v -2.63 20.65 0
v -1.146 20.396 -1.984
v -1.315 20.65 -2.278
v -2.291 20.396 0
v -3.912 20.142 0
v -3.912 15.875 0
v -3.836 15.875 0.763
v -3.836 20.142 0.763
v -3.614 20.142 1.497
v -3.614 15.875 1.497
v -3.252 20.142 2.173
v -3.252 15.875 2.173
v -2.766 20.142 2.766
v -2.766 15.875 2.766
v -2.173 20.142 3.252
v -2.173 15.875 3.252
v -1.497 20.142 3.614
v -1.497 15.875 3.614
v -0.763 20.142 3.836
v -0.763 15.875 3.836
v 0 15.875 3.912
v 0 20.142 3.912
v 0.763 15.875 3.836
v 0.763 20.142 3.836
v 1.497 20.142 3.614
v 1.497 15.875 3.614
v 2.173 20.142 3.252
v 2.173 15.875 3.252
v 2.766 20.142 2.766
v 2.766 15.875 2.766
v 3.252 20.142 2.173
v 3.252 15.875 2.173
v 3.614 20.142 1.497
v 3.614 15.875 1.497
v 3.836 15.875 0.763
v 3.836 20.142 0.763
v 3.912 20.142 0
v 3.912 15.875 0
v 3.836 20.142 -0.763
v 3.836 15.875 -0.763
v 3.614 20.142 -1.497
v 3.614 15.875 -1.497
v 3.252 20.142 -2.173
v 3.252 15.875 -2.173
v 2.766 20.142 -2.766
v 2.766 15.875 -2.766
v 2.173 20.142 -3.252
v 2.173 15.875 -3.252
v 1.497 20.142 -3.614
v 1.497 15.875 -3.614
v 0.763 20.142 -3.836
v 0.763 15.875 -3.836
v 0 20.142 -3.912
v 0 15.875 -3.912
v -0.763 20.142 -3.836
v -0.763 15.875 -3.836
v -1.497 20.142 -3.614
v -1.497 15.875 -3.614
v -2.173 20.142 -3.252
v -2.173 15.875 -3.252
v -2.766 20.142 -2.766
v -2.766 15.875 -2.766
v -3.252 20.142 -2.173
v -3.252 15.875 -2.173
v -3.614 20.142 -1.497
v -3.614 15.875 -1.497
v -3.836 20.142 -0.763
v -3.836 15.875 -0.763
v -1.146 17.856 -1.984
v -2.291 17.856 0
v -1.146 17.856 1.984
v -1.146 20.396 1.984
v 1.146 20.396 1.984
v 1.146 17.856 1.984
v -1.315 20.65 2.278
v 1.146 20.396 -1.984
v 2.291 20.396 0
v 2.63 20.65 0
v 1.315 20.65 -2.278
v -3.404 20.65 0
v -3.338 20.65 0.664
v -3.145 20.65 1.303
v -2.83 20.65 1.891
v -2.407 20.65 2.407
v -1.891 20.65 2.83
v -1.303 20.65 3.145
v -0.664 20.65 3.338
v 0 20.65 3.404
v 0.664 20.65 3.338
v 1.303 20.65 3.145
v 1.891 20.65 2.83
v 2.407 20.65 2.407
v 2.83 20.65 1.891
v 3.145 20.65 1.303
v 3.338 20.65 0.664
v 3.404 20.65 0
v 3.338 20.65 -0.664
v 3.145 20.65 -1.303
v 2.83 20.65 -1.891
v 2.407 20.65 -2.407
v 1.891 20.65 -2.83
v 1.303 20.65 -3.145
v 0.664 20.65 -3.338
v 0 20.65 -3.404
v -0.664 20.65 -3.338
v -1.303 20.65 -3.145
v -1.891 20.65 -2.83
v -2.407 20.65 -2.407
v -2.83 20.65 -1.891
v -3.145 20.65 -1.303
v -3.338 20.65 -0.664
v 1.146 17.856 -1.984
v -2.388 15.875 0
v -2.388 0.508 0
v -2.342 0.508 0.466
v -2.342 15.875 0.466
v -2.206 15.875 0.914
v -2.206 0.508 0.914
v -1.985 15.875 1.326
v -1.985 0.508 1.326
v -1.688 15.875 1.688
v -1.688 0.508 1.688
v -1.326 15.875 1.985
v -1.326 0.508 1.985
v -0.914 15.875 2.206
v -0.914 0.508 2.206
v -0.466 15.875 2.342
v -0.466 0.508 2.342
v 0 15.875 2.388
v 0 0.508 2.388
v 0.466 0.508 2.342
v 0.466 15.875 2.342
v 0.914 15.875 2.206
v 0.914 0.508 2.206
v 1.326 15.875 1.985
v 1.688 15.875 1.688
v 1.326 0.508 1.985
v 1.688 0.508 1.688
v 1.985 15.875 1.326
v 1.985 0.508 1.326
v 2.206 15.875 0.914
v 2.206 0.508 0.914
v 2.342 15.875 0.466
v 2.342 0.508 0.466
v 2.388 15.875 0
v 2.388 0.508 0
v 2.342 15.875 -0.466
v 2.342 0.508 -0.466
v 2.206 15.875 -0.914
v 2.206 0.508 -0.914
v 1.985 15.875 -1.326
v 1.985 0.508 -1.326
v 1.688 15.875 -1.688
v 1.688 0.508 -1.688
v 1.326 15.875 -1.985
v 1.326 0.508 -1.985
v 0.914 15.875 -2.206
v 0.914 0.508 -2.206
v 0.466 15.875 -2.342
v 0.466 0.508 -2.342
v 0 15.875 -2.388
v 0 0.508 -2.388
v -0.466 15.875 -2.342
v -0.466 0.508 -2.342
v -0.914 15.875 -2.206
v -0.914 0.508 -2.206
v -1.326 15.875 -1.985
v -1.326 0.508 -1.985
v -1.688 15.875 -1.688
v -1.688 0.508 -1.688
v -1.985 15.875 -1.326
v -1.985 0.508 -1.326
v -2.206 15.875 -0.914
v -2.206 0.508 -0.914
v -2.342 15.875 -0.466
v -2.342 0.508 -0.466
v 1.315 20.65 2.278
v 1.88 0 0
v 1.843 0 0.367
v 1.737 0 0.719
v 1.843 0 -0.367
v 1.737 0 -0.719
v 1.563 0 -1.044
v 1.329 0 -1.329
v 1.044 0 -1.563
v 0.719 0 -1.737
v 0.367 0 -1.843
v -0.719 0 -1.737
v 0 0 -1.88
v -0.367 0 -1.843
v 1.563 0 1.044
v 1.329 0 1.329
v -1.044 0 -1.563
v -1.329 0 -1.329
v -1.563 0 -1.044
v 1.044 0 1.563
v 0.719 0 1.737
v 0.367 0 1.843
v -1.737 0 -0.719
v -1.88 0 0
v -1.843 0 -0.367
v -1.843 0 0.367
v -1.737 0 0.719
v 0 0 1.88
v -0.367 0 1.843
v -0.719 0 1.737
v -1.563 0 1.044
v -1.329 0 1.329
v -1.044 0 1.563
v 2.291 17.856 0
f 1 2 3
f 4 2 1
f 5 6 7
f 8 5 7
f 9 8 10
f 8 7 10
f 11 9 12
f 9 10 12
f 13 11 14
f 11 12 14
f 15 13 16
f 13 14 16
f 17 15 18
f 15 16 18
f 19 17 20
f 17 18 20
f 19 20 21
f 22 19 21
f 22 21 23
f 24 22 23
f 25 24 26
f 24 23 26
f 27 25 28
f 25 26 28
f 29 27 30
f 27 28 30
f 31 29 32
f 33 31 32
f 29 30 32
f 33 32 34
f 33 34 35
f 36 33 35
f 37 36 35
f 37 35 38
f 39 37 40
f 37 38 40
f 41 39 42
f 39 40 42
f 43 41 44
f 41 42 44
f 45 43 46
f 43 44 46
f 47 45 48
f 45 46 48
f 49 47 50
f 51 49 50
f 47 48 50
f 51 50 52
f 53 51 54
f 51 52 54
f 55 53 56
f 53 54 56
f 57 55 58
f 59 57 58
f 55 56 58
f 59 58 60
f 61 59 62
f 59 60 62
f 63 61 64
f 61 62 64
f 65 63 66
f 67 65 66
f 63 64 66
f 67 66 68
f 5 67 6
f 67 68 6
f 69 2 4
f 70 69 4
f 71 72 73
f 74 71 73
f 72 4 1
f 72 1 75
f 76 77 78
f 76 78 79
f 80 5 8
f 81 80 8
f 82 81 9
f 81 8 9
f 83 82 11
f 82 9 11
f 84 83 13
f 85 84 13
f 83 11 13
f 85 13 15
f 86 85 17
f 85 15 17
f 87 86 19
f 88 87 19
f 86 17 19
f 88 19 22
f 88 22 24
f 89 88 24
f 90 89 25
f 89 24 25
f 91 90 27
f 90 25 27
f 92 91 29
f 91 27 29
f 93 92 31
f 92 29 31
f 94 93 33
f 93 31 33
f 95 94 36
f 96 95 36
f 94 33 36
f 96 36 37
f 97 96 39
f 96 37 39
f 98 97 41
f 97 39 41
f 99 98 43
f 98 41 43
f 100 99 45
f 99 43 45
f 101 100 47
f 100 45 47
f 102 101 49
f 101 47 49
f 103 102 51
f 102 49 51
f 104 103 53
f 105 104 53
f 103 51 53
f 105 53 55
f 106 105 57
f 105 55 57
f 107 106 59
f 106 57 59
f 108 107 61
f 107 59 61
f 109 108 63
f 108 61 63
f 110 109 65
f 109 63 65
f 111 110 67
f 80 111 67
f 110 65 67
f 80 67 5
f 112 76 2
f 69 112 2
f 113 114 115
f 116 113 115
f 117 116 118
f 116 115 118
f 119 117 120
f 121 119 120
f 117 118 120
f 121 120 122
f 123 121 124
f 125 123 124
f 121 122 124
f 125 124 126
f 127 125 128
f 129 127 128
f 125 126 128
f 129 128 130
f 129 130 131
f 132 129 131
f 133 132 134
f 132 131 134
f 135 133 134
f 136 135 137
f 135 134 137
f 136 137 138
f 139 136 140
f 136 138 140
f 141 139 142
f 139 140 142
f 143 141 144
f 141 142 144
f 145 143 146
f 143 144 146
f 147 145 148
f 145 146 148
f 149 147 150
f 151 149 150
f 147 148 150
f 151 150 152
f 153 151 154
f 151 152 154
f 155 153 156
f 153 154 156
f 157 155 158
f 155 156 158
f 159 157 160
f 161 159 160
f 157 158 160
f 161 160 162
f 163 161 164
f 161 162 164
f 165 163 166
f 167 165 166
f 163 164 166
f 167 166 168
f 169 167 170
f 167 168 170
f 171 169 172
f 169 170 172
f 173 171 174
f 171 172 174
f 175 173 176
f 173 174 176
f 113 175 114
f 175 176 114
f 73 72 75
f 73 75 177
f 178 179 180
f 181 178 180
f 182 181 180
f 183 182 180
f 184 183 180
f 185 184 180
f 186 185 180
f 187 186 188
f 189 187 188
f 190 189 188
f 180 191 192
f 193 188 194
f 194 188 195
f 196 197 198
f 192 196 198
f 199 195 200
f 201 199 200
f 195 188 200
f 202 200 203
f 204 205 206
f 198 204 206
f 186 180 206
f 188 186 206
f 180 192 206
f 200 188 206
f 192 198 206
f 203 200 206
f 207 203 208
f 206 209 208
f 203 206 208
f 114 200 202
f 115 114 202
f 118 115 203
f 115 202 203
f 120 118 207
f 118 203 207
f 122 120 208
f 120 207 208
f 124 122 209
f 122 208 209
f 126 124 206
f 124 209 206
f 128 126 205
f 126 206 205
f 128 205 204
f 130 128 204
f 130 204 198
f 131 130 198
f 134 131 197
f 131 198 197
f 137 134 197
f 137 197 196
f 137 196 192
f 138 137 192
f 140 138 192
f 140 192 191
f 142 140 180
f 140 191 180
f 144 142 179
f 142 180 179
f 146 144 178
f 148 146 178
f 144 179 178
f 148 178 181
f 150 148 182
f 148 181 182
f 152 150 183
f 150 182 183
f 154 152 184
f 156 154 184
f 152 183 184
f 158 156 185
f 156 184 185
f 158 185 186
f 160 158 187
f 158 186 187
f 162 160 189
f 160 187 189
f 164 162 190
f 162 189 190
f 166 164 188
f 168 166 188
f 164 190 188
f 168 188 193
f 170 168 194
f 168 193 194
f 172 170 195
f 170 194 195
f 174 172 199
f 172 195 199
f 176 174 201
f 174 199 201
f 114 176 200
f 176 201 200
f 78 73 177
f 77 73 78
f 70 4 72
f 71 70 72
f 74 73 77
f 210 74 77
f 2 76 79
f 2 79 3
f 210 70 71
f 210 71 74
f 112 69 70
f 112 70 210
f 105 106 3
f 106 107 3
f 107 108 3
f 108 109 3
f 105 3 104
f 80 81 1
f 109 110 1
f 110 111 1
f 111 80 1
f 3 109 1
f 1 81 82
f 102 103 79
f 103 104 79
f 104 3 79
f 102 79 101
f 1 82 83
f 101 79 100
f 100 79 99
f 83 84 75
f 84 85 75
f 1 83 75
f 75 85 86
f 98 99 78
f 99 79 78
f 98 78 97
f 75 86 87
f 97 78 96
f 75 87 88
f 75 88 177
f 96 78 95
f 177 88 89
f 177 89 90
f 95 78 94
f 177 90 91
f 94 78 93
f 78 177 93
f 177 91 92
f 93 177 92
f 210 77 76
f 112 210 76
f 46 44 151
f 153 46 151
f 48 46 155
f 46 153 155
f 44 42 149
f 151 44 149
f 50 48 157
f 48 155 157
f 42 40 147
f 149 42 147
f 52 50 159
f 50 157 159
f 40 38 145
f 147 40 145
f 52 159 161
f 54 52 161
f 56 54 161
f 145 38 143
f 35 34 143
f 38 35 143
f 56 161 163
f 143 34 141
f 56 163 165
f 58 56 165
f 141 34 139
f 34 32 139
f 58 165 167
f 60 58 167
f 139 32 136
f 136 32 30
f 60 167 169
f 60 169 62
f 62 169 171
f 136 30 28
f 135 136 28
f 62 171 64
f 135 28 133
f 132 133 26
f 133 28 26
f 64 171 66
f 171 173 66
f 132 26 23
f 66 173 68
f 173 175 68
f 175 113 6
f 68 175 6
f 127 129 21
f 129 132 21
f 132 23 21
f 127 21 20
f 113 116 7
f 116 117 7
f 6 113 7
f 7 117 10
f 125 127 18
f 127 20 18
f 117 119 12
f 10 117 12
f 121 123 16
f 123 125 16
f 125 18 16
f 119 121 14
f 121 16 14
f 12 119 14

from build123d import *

# Parameters (mm, degrees)
EXTRUDE1_DEPTH = 2.794
CHAMFER1_SIZE  = 0.508
CHAMFER2_SIZE  = 0.29329394
CHAMFER2_SIZE2 = 0.253999961


with BuildPart() as part:
    # Sketch1 → Revolve1 (revolve)
    with BuildSketch(Plane.XY):
        Polygon((0, 0), (0, 20.6502), (-3.9116, 20.6502), (-3.9116, 15.875), (-2.3876, 15.875), (-2.3876, 0), align=None)
    revolve(axis=Axis((0, 0, 0), (0, 1, 0)))

    # Sketch2 → Extrude1 (cut)
    with BuildSketch(Plane(origin=(0, 20.6502, 0), x_dir=(1, 0, 0), z_dir=(0, 1, 0))):
        Polygon((2.2913594, 0), (1.1456797, 1.98437545), (-1.1456797, 1.98437545), (-2.2913594, 0), (-1.1456797, -1.98437545), (1.1456797, -1.98437545), align=None)
    extrude(amount=-EXTRUDE1_DEPTH, mode=Mode.SUBTRACT)

    # Chamfer1
    chamfer1_edges = [part.edges().sort_by_distance(p)[0] for p in [
        (2.3876, 0, 0),
        (3.9116, 20.6502, 0),
    ]]
    chamfer(chamfer1_edges, length=CHAMFER1_SIZE)

    # Chamfer2
    chamfer2_edges = [part.edges().sort_by_distance(p)[0] for p in [
        (1.71851955, 20.6502, 0.992187725),
        (1.71851955, 20.6502, -0.992187725),
        (0, 20.6502, -1.98437545),
        (-1.71851955, 20.6502, -0.992187725),
        (-1.71851955, 20.6502, 0.992187725),
        (0, 20.6502, 1.98437545),
    ]]
    chamfer2_side = [part.faces().sort_by_distance(p)[0] for p in [
        (3.307331654, 20.6502, 0),
    ]]
    chamfer(chamfer2_edges, length=CHAMFER2_SIZE, length2=CHAMFER2_SIZE2, reference=chamfer2_side[0])


solid = part.part
